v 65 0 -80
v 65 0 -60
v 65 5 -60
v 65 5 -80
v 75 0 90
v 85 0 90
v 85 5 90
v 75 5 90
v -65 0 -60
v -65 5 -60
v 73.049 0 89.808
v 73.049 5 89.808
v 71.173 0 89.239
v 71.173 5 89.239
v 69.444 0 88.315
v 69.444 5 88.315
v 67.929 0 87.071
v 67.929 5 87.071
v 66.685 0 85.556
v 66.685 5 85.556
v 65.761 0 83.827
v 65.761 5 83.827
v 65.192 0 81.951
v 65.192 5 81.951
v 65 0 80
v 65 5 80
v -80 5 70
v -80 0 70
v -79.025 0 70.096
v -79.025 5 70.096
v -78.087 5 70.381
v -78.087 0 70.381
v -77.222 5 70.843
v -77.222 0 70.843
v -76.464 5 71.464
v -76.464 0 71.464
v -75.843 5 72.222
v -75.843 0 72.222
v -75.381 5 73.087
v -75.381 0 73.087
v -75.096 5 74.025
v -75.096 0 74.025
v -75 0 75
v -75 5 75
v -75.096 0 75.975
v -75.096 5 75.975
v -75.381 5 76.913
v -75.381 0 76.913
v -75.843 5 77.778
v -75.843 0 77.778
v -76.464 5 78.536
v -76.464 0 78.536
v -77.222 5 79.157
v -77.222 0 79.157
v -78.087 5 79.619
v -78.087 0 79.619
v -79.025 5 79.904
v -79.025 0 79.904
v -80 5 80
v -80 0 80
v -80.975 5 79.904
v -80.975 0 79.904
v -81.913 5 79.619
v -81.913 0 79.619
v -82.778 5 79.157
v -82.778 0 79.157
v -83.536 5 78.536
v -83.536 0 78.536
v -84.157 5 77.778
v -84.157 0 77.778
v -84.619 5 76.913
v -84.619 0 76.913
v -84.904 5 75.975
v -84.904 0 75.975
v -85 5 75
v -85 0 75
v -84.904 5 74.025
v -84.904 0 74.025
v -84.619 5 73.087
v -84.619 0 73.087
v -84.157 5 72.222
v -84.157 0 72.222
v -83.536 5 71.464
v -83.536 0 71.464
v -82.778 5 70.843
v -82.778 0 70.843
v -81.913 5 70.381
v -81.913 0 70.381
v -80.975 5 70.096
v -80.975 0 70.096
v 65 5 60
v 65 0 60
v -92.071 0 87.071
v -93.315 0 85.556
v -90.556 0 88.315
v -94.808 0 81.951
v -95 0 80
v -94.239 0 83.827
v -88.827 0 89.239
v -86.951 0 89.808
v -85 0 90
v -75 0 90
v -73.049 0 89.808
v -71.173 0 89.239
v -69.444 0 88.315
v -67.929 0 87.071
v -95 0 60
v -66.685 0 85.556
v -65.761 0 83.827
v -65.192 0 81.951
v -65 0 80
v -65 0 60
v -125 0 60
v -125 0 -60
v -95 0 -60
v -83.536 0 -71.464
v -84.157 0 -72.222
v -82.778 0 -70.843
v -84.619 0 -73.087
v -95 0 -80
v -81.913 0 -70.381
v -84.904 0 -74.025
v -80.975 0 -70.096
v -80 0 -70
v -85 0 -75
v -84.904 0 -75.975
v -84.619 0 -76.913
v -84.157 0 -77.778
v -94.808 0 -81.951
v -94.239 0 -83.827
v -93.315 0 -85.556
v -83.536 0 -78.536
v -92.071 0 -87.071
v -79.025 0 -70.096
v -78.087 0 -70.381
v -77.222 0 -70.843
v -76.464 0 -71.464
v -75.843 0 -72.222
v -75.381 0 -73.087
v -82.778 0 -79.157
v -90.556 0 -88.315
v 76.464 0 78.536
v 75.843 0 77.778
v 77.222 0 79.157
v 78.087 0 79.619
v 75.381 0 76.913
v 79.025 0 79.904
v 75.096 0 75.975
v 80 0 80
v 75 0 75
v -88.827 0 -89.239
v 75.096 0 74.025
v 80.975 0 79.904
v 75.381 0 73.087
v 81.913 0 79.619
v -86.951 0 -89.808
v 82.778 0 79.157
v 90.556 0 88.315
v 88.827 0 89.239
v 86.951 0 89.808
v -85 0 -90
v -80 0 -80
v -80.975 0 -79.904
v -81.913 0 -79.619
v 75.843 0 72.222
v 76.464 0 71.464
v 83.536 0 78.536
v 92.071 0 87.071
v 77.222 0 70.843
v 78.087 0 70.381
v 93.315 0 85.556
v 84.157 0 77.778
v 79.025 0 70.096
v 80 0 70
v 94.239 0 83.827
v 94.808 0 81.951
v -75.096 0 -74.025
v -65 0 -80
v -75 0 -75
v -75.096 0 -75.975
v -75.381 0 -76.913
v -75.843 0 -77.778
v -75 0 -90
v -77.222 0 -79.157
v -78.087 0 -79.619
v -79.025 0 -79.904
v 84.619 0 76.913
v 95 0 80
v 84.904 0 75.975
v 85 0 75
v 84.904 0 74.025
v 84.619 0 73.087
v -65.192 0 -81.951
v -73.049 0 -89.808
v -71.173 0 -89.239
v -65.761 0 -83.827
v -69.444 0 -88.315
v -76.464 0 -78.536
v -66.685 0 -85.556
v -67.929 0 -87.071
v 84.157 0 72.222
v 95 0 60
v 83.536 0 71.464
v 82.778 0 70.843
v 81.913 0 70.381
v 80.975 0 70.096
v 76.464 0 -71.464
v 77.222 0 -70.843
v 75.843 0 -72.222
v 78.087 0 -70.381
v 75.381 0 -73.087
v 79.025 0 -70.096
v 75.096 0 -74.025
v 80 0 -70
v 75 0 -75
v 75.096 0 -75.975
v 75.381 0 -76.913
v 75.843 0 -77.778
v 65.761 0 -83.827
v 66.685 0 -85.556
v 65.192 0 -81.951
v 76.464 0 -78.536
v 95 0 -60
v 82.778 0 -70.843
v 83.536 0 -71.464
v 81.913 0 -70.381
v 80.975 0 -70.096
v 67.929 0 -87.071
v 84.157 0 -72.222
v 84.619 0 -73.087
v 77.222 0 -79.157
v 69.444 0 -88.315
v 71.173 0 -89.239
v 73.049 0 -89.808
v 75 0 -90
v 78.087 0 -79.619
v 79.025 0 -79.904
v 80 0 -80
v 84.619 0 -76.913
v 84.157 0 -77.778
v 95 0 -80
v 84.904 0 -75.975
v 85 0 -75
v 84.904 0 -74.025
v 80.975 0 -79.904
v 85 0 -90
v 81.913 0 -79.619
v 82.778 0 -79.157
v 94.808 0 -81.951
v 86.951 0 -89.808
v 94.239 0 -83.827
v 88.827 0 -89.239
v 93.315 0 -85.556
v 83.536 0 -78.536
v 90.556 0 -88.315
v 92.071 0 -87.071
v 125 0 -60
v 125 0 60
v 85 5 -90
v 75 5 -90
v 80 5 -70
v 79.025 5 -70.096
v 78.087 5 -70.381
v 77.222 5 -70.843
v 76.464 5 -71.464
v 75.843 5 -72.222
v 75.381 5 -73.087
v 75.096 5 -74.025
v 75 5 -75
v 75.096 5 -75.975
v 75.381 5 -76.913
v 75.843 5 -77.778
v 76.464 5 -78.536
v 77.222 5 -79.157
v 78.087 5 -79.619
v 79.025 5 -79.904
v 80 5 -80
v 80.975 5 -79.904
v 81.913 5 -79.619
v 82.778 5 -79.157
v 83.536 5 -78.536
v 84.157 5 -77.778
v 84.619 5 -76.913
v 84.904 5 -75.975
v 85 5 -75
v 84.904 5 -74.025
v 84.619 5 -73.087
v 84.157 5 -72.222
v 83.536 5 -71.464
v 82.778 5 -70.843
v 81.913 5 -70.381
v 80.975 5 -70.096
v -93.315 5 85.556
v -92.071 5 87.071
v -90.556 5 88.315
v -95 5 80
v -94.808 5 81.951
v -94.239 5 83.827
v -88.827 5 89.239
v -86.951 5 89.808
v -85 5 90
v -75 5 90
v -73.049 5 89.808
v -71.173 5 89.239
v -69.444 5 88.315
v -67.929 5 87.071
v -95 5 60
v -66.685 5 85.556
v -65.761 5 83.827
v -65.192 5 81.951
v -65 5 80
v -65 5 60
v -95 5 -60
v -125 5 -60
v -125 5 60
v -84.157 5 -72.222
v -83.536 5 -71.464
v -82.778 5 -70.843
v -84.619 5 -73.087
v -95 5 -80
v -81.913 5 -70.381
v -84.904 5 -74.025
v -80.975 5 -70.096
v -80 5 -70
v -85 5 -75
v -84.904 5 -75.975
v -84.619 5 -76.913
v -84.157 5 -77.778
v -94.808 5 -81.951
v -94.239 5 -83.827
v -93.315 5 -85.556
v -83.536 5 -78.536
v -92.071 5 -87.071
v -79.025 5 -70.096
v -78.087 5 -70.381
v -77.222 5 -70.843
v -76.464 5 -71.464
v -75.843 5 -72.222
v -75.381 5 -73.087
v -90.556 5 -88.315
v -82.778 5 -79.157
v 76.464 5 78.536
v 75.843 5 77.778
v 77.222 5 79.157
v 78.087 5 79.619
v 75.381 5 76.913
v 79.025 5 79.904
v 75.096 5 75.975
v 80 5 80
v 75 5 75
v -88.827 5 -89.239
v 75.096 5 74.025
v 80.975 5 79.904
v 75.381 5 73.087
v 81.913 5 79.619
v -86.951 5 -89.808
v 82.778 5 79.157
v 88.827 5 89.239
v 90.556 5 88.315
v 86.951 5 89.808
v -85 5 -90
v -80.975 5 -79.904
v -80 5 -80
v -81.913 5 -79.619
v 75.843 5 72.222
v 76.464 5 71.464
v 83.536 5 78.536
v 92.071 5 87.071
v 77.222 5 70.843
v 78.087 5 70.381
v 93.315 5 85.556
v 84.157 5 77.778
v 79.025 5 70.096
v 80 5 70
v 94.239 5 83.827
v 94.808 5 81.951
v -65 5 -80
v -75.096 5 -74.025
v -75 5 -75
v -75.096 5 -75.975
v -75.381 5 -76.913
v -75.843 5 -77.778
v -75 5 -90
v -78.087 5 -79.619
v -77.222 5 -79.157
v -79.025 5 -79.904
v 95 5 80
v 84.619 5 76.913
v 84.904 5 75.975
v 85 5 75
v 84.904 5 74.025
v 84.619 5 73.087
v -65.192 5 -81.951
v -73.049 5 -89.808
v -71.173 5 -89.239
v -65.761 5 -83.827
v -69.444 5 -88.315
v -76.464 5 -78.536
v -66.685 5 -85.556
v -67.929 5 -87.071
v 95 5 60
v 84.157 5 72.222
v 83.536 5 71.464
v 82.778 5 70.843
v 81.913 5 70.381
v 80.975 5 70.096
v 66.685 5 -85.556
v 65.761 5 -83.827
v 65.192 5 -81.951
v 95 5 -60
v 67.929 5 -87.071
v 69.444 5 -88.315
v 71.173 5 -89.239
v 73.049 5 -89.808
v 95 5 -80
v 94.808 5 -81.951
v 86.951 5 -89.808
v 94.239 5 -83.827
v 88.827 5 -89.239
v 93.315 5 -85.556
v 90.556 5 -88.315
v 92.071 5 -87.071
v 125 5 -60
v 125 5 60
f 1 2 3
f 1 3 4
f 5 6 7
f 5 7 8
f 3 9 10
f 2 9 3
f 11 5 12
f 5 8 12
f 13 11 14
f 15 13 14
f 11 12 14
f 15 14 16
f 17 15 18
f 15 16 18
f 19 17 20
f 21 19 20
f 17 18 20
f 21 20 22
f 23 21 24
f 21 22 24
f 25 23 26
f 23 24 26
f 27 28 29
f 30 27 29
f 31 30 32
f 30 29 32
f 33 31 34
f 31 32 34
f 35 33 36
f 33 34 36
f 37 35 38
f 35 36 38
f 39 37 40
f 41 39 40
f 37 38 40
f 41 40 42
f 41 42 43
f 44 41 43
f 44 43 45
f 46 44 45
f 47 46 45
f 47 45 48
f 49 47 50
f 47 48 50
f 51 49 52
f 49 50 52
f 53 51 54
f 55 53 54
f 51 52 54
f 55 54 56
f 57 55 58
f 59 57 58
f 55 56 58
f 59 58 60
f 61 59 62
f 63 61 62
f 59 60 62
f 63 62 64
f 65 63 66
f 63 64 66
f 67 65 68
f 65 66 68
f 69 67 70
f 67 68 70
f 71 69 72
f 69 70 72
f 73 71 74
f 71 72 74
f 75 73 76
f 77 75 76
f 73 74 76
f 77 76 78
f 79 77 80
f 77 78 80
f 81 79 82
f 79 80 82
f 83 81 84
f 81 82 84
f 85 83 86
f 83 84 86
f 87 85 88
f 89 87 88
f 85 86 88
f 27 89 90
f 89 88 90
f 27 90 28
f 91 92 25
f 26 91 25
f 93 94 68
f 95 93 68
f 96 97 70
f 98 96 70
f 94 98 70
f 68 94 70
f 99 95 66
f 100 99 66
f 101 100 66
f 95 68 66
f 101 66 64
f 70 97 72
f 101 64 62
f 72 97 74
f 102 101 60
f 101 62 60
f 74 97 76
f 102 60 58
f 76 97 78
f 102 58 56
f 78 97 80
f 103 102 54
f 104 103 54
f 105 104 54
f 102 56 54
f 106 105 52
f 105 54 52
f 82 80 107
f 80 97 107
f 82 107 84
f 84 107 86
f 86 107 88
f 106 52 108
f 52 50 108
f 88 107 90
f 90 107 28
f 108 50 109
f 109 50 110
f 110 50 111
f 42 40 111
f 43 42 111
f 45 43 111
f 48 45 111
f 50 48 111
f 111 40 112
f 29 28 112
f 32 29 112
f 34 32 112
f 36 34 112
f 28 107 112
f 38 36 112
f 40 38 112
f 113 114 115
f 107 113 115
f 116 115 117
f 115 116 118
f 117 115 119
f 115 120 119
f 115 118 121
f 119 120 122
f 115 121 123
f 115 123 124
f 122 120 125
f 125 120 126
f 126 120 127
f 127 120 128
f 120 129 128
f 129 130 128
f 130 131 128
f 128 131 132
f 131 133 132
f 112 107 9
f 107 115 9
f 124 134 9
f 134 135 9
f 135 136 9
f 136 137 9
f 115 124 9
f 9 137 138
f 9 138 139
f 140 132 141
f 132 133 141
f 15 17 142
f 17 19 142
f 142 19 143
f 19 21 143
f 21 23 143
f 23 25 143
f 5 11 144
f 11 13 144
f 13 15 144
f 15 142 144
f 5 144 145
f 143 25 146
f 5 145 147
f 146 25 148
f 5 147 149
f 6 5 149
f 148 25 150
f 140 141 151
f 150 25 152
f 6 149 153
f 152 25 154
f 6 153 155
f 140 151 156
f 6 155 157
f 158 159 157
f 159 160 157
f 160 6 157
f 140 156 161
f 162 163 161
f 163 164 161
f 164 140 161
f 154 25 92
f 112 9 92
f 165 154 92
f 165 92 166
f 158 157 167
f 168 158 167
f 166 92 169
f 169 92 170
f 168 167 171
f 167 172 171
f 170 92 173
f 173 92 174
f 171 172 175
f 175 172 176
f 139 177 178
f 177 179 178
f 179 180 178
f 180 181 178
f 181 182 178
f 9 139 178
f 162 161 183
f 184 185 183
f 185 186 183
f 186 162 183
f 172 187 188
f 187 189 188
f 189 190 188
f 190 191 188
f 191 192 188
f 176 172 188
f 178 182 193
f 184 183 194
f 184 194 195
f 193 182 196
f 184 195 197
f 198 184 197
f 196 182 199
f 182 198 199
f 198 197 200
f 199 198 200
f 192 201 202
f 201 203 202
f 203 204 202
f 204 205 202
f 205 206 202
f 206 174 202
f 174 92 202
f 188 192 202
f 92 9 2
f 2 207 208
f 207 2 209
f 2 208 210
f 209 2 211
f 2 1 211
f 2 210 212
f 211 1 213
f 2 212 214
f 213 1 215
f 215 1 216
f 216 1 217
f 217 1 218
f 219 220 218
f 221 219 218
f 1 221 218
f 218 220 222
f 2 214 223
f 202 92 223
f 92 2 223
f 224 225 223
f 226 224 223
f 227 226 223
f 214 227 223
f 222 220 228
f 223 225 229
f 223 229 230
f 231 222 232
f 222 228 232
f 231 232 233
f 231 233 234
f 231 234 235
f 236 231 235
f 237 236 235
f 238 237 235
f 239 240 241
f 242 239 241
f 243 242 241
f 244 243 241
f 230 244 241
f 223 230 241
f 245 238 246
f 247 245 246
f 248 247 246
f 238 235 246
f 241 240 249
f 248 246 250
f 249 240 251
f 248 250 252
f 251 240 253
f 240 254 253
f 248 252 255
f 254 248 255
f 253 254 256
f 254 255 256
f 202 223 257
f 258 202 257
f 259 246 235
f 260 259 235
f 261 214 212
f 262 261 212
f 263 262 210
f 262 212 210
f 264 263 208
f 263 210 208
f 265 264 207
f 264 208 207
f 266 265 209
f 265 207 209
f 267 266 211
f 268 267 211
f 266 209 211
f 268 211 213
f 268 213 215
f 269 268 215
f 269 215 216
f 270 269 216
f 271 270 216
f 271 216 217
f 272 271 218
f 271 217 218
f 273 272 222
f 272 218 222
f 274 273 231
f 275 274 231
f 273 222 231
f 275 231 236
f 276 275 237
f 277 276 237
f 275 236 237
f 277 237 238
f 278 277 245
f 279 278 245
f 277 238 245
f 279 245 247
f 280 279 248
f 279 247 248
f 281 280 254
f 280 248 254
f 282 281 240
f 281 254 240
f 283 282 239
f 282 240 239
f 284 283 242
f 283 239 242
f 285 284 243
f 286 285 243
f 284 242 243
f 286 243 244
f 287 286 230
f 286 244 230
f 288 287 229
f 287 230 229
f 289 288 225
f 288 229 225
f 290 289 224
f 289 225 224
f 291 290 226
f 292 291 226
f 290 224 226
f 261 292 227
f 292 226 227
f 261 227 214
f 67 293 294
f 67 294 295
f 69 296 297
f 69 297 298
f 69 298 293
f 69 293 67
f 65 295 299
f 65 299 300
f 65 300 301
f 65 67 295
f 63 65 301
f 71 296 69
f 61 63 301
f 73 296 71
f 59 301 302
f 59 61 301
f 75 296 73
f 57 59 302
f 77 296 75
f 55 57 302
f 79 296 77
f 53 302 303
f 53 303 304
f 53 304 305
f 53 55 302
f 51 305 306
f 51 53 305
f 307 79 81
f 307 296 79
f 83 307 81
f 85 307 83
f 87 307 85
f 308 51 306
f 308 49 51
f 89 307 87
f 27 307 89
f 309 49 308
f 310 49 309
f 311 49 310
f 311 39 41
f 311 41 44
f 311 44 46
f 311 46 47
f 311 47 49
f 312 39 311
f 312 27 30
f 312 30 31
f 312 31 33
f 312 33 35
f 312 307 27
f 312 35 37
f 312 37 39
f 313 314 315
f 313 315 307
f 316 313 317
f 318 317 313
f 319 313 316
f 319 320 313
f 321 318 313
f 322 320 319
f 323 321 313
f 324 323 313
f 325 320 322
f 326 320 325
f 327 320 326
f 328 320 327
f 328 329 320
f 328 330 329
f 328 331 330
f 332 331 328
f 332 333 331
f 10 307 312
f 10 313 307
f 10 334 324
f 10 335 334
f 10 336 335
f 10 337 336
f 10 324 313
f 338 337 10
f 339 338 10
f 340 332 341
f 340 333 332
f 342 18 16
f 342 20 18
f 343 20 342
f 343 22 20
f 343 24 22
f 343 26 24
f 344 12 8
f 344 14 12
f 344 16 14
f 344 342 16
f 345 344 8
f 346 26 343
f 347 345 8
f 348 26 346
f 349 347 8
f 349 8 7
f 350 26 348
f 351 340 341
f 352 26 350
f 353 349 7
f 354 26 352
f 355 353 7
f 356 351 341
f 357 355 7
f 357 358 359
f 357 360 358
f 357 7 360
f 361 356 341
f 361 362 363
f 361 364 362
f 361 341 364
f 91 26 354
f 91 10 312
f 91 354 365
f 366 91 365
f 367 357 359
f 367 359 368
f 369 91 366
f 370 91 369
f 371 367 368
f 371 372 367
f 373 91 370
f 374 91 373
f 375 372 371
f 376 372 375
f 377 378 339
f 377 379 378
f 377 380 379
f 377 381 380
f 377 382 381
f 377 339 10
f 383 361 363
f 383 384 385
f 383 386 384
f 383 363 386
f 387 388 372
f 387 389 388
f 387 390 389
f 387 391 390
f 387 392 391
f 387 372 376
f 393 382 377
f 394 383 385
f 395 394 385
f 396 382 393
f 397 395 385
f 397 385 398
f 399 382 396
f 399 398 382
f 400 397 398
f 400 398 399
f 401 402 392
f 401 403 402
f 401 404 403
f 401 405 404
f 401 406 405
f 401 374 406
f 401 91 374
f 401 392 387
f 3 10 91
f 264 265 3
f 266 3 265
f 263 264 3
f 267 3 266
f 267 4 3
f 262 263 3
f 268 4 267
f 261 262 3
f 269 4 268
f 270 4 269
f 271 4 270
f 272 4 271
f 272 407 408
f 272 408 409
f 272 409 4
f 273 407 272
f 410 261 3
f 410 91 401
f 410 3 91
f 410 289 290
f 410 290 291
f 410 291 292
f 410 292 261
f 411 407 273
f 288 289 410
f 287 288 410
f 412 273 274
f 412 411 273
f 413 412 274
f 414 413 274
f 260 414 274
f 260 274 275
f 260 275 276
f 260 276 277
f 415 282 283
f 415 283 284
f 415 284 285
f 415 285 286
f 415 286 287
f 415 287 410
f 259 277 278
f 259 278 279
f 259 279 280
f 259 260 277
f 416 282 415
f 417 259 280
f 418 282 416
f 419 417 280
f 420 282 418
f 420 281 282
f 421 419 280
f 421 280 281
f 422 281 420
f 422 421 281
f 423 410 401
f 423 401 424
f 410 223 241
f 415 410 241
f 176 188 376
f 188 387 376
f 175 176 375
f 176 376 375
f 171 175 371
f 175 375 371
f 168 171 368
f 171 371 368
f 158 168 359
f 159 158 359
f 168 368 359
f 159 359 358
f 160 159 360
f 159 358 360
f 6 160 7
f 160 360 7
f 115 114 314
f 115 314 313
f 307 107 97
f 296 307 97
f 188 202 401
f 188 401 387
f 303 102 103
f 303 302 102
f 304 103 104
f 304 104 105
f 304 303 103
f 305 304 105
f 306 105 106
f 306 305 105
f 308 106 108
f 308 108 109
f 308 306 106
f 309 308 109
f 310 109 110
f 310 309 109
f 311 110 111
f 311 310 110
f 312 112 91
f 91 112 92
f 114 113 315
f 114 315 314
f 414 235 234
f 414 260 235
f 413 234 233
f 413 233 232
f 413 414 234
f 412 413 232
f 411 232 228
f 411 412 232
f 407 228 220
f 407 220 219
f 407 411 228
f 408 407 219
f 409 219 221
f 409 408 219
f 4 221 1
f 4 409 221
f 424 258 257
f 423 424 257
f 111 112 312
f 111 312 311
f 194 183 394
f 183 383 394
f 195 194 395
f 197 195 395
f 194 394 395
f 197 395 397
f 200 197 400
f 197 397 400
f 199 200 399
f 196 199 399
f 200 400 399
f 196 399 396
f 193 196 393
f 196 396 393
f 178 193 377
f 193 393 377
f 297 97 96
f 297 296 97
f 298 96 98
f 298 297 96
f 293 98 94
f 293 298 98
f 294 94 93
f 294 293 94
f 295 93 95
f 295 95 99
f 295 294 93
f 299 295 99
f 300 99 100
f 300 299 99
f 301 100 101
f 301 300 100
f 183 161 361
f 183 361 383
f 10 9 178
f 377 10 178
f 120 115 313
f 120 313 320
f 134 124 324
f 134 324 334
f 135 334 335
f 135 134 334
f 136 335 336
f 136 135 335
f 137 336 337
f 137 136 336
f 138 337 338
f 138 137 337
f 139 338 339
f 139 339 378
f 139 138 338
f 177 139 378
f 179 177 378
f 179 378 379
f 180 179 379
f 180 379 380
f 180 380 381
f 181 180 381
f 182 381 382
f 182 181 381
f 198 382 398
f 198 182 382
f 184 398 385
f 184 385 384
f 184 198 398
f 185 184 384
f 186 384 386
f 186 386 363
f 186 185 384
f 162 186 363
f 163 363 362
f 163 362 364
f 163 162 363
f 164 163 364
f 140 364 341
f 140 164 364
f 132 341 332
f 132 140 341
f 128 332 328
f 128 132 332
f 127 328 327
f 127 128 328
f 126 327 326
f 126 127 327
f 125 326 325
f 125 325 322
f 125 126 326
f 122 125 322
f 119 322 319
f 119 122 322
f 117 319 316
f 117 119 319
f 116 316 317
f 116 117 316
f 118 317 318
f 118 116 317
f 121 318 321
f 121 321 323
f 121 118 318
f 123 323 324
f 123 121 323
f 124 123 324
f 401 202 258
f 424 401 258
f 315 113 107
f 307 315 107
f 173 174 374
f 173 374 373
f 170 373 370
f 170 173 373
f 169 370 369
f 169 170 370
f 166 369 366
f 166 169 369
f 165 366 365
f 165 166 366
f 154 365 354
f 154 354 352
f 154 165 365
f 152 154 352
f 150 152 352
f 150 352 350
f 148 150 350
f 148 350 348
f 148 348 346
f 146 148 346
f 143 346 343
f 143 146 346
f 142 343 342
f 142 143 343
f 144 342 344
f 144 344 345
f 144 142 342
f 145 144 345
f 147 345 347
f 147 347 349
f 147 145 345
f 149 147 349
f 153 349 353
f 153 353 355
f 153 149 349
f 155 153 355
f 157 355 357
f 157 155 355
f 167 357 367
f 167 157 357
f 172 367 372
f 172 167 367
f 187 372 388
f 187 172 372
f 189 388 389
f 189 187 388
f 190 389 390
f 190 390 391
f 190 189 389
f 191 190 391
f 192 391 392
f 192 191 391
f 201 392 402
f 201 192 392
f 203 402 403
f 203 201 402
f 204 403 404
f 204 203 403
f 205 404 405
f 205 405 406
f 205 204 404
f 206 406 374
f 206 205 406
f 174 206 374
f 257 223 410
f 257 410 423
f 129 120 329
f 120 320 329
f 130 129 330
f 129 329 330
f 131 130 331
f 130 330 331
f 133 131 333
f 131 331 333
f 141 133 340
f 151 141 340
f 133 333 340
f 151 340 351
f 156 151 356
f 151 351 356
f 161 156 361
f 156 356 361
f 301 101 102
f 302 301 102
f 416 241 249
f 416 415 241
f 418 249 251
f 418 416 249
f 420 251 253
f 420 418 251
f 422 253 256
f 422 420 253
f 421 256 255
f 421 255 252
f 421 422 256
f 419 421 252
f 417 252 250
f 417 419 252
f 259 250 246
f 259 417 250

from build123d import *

# Parameters (mm, degrees)
SKETCH_1_W      = 250
SKETCH_1_H      = 120
EXTRUDE_1_DEPTH = 5
SKETCH_2_W      = 30
SKETCH_2_H      = 30
SKETCH_2_R      = 5
EXTRUDE_2_DEPTH = 5
FILLET_1_R      = 10


with BuildPart() as part:
    # Эскиз1 → Бобышка-Вытянуть1 (new body)
    with BuildSketch(Plane(origin=(0, 0, 0), x_dir=(1, 0, 0), z_dir=(0, 1, 0))):
        Rectangle(SKETCH_1_W, SKETCH_1_H)
    extrude(amount=EXTRUDE_1_DEPTH)


with BuildPart() as body_2:
    # Эскиз2 → Бобышка-Вытянуть2 (new body)
    with BuildSketch(Plane(origin=(0, 0, 0), x_dir=(1, 0, 0), z_dir=(0, 1, 0))):
        with Locations((-80, 75)):
            Rectangle(SKETCH_2_W, SKETCH_2_H)
        with Locations(Location((-80, 75, 0), (0, 0, 270))):
            Circle(SKETCH_2_R, mode=Mode.SUBTRACT)
    extrude(amount=EXTRUDE_2_DEPTH)

    # Скругление1
    fillet_1_edges = [body_2.edges().sort_by_distance(p)[0] for p in [
        (-95, 2.5, -90),
        (-65, 2.5, -90),
    ]]
    fillet(fillet_1_edges, radius=FILLET_1_R)


with BuildPart() as body_3:
    # Зеркальное отражение1: mirrored copy
    add(body_2.part.mirror(Plane(origin=(0, 0, 0), x_dir=(0, 0, 1), z_dir=(1, 0, 0))))


with BuildPart() as body_4:
    # Зеркальное отражение3: mirrored copy
    add(body_2.part.mirror(Plane.XY))


with BuildPart() as body_5:
    # Mirror 3 2: mirrored copy
    add(body_3.part.mirror(Plane.XY))


with BuildPart() as part_1:
    add(part.part)

    # Combine 1: union body 4, body 3, body 2, body 5
    add(body_4.part)
    add(body_3.part)
    add(body_2.part)
    add(body_5.part)


solid = part_1.part
